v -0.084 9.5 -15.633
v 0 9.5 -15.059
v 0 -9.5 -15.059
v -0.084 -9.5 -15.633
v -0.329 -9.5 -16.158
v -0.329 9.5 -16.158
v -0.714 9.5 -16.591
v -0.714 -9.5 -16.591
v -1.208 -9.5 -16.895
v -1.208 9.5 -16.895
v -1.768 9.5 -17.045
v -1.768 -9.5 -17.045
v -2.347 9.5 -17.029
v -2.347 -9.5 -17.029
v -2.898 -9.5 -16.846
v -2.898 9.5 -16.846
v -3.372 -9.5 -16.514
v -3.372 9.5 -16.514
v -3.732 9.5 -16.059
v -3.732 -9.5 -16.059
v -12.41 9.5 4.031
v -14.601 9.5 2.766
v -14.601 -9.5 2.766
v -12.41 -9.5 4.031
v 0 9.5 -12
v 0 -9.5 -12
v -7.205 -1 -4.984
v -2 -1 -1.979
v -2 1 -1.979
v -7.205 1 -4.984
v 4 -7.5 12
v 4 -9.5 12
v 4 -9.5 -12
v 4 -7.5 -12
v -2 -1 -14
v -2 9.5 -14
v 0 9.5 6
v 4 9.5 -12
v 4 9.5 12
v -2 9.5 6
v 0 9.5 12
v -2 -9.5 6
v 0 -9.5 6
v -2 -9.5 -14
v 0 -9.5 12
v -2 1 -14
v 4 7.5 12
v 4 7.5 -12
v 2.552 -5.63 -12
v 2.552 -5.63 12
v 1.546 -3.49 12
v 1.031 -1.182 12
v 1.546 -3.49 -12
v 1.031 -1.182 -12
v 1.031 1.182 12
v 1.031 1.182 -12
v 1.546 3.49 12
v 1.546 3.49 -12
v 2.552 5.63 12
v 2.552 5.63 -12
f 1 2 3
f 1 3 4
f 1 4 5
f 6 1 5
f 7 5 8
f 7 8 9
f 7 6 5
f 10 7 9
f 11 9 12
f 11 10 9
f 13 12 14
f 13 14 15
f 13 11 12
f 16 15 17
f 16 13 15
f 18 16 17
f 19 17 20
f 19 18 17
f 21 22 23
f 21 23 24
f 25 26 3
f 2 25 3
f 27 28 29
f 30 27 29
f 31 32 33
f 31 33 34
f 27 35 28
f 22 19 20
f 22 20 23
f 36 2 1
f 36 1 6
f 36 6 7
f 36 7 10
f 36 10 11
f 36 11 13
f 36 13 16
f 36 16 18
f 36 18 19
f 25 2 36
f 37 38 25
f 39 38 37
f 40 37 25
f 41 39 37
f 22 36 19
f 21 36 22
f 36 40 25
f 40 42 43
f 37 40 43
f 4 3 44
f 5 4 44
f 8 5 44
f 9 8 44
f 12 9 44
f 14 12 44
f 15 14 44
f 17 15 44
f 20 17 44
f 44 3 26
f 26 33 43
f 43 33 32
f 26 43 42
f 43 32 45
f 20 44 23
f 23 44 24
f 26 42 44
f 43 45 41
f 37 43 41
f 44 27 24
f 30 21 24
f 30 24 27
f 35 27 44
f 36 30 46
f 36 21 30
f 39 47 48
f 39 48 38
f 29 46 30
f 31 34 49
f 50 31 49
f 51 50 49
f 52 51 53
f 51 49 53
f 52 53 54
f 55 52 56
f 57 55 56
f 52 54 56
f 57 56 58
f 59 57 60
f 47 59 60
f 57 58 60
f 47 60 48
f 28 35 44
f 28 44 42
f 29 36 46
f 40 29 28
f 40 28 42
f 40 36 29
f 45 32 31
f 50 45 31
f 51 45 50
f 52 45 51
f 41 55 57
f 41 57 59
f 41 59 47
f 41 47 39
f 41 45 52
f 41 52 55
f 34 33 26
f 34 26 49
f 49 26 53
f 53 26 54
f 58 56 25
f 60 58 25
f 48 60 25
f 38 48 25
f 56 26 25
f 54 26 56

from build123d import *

# Parameters (mm, degrees)
F0_W     = 19
F0_H     = 24
F1_DEPTH = 4
F3_DEPTH = 19
F4_W     = 2
F4_H     = 10.4102807478
F7_DEPTH = 24.001


with BuildPart() as f1:
    # F0 (on Right) → F1 (new body)
    with BuildSketch(Plane.YZ):
        Rectangle(F0_W, F0_H)
    extrude(amount=F1_DEPTH)

    # F2 (on face) → F3 (join, through all)
    with BuildSketch(Plane(origin=(0, 9.5, 0), x_dir=(-1, 0, 0), z_dir=(0, 1, 0))):
        with BuildLine():
            Line((2, 6), (0, 6))
            Line((0, 6), (0, -15.05894568))
            ThreePointArc((0, -15.05894568), (1.4823619098, -16.9907973326), (3.7320508076, -16.05894568))
            Line((3.7320508076, -16.05894568), (14.6008684854, 2.7663987562))
            Line((14.6008684854, 2.7663987562), (12.4102807478, 4.0311351762))
            Line((12.4102807478, 4.0311351762), (2, -14))
            Line((2, -14), (2, 6))
        make_face()
    extrude(amount=-F3_DEPTH)

    # F4 (on face) → F5 (join, up to the next surface of F1)
    with BuildSketch(Plane(origin=(-7.5621778265, 0, -4.3660254038), x_dir=(0, 1, 0), z_dir=(0.8660254038, 0, 0.5))):
        with Locations((0, -5.9192152791)):
            Rectangle(F4_W, F4_H)
    extrude(until=Until.NEXT)

    # F6 (on face) → F7 (cut, through all)
    with BuildSketch(Plane(origin=(0, 0, -12), x_dir=(1, 0, 0), z_dir=(0, 0, -1))):
        with BuildLine():
            Line((4, -7.5), (4, 7.5))
            ThreePointArc((4, 7.5), (0.9658907755, 0), (4, -7.5))
        make_face()
    extrude(amount=-F7_DEPTH, mode=Mode.SUBTRACT)


solid = f1.part
